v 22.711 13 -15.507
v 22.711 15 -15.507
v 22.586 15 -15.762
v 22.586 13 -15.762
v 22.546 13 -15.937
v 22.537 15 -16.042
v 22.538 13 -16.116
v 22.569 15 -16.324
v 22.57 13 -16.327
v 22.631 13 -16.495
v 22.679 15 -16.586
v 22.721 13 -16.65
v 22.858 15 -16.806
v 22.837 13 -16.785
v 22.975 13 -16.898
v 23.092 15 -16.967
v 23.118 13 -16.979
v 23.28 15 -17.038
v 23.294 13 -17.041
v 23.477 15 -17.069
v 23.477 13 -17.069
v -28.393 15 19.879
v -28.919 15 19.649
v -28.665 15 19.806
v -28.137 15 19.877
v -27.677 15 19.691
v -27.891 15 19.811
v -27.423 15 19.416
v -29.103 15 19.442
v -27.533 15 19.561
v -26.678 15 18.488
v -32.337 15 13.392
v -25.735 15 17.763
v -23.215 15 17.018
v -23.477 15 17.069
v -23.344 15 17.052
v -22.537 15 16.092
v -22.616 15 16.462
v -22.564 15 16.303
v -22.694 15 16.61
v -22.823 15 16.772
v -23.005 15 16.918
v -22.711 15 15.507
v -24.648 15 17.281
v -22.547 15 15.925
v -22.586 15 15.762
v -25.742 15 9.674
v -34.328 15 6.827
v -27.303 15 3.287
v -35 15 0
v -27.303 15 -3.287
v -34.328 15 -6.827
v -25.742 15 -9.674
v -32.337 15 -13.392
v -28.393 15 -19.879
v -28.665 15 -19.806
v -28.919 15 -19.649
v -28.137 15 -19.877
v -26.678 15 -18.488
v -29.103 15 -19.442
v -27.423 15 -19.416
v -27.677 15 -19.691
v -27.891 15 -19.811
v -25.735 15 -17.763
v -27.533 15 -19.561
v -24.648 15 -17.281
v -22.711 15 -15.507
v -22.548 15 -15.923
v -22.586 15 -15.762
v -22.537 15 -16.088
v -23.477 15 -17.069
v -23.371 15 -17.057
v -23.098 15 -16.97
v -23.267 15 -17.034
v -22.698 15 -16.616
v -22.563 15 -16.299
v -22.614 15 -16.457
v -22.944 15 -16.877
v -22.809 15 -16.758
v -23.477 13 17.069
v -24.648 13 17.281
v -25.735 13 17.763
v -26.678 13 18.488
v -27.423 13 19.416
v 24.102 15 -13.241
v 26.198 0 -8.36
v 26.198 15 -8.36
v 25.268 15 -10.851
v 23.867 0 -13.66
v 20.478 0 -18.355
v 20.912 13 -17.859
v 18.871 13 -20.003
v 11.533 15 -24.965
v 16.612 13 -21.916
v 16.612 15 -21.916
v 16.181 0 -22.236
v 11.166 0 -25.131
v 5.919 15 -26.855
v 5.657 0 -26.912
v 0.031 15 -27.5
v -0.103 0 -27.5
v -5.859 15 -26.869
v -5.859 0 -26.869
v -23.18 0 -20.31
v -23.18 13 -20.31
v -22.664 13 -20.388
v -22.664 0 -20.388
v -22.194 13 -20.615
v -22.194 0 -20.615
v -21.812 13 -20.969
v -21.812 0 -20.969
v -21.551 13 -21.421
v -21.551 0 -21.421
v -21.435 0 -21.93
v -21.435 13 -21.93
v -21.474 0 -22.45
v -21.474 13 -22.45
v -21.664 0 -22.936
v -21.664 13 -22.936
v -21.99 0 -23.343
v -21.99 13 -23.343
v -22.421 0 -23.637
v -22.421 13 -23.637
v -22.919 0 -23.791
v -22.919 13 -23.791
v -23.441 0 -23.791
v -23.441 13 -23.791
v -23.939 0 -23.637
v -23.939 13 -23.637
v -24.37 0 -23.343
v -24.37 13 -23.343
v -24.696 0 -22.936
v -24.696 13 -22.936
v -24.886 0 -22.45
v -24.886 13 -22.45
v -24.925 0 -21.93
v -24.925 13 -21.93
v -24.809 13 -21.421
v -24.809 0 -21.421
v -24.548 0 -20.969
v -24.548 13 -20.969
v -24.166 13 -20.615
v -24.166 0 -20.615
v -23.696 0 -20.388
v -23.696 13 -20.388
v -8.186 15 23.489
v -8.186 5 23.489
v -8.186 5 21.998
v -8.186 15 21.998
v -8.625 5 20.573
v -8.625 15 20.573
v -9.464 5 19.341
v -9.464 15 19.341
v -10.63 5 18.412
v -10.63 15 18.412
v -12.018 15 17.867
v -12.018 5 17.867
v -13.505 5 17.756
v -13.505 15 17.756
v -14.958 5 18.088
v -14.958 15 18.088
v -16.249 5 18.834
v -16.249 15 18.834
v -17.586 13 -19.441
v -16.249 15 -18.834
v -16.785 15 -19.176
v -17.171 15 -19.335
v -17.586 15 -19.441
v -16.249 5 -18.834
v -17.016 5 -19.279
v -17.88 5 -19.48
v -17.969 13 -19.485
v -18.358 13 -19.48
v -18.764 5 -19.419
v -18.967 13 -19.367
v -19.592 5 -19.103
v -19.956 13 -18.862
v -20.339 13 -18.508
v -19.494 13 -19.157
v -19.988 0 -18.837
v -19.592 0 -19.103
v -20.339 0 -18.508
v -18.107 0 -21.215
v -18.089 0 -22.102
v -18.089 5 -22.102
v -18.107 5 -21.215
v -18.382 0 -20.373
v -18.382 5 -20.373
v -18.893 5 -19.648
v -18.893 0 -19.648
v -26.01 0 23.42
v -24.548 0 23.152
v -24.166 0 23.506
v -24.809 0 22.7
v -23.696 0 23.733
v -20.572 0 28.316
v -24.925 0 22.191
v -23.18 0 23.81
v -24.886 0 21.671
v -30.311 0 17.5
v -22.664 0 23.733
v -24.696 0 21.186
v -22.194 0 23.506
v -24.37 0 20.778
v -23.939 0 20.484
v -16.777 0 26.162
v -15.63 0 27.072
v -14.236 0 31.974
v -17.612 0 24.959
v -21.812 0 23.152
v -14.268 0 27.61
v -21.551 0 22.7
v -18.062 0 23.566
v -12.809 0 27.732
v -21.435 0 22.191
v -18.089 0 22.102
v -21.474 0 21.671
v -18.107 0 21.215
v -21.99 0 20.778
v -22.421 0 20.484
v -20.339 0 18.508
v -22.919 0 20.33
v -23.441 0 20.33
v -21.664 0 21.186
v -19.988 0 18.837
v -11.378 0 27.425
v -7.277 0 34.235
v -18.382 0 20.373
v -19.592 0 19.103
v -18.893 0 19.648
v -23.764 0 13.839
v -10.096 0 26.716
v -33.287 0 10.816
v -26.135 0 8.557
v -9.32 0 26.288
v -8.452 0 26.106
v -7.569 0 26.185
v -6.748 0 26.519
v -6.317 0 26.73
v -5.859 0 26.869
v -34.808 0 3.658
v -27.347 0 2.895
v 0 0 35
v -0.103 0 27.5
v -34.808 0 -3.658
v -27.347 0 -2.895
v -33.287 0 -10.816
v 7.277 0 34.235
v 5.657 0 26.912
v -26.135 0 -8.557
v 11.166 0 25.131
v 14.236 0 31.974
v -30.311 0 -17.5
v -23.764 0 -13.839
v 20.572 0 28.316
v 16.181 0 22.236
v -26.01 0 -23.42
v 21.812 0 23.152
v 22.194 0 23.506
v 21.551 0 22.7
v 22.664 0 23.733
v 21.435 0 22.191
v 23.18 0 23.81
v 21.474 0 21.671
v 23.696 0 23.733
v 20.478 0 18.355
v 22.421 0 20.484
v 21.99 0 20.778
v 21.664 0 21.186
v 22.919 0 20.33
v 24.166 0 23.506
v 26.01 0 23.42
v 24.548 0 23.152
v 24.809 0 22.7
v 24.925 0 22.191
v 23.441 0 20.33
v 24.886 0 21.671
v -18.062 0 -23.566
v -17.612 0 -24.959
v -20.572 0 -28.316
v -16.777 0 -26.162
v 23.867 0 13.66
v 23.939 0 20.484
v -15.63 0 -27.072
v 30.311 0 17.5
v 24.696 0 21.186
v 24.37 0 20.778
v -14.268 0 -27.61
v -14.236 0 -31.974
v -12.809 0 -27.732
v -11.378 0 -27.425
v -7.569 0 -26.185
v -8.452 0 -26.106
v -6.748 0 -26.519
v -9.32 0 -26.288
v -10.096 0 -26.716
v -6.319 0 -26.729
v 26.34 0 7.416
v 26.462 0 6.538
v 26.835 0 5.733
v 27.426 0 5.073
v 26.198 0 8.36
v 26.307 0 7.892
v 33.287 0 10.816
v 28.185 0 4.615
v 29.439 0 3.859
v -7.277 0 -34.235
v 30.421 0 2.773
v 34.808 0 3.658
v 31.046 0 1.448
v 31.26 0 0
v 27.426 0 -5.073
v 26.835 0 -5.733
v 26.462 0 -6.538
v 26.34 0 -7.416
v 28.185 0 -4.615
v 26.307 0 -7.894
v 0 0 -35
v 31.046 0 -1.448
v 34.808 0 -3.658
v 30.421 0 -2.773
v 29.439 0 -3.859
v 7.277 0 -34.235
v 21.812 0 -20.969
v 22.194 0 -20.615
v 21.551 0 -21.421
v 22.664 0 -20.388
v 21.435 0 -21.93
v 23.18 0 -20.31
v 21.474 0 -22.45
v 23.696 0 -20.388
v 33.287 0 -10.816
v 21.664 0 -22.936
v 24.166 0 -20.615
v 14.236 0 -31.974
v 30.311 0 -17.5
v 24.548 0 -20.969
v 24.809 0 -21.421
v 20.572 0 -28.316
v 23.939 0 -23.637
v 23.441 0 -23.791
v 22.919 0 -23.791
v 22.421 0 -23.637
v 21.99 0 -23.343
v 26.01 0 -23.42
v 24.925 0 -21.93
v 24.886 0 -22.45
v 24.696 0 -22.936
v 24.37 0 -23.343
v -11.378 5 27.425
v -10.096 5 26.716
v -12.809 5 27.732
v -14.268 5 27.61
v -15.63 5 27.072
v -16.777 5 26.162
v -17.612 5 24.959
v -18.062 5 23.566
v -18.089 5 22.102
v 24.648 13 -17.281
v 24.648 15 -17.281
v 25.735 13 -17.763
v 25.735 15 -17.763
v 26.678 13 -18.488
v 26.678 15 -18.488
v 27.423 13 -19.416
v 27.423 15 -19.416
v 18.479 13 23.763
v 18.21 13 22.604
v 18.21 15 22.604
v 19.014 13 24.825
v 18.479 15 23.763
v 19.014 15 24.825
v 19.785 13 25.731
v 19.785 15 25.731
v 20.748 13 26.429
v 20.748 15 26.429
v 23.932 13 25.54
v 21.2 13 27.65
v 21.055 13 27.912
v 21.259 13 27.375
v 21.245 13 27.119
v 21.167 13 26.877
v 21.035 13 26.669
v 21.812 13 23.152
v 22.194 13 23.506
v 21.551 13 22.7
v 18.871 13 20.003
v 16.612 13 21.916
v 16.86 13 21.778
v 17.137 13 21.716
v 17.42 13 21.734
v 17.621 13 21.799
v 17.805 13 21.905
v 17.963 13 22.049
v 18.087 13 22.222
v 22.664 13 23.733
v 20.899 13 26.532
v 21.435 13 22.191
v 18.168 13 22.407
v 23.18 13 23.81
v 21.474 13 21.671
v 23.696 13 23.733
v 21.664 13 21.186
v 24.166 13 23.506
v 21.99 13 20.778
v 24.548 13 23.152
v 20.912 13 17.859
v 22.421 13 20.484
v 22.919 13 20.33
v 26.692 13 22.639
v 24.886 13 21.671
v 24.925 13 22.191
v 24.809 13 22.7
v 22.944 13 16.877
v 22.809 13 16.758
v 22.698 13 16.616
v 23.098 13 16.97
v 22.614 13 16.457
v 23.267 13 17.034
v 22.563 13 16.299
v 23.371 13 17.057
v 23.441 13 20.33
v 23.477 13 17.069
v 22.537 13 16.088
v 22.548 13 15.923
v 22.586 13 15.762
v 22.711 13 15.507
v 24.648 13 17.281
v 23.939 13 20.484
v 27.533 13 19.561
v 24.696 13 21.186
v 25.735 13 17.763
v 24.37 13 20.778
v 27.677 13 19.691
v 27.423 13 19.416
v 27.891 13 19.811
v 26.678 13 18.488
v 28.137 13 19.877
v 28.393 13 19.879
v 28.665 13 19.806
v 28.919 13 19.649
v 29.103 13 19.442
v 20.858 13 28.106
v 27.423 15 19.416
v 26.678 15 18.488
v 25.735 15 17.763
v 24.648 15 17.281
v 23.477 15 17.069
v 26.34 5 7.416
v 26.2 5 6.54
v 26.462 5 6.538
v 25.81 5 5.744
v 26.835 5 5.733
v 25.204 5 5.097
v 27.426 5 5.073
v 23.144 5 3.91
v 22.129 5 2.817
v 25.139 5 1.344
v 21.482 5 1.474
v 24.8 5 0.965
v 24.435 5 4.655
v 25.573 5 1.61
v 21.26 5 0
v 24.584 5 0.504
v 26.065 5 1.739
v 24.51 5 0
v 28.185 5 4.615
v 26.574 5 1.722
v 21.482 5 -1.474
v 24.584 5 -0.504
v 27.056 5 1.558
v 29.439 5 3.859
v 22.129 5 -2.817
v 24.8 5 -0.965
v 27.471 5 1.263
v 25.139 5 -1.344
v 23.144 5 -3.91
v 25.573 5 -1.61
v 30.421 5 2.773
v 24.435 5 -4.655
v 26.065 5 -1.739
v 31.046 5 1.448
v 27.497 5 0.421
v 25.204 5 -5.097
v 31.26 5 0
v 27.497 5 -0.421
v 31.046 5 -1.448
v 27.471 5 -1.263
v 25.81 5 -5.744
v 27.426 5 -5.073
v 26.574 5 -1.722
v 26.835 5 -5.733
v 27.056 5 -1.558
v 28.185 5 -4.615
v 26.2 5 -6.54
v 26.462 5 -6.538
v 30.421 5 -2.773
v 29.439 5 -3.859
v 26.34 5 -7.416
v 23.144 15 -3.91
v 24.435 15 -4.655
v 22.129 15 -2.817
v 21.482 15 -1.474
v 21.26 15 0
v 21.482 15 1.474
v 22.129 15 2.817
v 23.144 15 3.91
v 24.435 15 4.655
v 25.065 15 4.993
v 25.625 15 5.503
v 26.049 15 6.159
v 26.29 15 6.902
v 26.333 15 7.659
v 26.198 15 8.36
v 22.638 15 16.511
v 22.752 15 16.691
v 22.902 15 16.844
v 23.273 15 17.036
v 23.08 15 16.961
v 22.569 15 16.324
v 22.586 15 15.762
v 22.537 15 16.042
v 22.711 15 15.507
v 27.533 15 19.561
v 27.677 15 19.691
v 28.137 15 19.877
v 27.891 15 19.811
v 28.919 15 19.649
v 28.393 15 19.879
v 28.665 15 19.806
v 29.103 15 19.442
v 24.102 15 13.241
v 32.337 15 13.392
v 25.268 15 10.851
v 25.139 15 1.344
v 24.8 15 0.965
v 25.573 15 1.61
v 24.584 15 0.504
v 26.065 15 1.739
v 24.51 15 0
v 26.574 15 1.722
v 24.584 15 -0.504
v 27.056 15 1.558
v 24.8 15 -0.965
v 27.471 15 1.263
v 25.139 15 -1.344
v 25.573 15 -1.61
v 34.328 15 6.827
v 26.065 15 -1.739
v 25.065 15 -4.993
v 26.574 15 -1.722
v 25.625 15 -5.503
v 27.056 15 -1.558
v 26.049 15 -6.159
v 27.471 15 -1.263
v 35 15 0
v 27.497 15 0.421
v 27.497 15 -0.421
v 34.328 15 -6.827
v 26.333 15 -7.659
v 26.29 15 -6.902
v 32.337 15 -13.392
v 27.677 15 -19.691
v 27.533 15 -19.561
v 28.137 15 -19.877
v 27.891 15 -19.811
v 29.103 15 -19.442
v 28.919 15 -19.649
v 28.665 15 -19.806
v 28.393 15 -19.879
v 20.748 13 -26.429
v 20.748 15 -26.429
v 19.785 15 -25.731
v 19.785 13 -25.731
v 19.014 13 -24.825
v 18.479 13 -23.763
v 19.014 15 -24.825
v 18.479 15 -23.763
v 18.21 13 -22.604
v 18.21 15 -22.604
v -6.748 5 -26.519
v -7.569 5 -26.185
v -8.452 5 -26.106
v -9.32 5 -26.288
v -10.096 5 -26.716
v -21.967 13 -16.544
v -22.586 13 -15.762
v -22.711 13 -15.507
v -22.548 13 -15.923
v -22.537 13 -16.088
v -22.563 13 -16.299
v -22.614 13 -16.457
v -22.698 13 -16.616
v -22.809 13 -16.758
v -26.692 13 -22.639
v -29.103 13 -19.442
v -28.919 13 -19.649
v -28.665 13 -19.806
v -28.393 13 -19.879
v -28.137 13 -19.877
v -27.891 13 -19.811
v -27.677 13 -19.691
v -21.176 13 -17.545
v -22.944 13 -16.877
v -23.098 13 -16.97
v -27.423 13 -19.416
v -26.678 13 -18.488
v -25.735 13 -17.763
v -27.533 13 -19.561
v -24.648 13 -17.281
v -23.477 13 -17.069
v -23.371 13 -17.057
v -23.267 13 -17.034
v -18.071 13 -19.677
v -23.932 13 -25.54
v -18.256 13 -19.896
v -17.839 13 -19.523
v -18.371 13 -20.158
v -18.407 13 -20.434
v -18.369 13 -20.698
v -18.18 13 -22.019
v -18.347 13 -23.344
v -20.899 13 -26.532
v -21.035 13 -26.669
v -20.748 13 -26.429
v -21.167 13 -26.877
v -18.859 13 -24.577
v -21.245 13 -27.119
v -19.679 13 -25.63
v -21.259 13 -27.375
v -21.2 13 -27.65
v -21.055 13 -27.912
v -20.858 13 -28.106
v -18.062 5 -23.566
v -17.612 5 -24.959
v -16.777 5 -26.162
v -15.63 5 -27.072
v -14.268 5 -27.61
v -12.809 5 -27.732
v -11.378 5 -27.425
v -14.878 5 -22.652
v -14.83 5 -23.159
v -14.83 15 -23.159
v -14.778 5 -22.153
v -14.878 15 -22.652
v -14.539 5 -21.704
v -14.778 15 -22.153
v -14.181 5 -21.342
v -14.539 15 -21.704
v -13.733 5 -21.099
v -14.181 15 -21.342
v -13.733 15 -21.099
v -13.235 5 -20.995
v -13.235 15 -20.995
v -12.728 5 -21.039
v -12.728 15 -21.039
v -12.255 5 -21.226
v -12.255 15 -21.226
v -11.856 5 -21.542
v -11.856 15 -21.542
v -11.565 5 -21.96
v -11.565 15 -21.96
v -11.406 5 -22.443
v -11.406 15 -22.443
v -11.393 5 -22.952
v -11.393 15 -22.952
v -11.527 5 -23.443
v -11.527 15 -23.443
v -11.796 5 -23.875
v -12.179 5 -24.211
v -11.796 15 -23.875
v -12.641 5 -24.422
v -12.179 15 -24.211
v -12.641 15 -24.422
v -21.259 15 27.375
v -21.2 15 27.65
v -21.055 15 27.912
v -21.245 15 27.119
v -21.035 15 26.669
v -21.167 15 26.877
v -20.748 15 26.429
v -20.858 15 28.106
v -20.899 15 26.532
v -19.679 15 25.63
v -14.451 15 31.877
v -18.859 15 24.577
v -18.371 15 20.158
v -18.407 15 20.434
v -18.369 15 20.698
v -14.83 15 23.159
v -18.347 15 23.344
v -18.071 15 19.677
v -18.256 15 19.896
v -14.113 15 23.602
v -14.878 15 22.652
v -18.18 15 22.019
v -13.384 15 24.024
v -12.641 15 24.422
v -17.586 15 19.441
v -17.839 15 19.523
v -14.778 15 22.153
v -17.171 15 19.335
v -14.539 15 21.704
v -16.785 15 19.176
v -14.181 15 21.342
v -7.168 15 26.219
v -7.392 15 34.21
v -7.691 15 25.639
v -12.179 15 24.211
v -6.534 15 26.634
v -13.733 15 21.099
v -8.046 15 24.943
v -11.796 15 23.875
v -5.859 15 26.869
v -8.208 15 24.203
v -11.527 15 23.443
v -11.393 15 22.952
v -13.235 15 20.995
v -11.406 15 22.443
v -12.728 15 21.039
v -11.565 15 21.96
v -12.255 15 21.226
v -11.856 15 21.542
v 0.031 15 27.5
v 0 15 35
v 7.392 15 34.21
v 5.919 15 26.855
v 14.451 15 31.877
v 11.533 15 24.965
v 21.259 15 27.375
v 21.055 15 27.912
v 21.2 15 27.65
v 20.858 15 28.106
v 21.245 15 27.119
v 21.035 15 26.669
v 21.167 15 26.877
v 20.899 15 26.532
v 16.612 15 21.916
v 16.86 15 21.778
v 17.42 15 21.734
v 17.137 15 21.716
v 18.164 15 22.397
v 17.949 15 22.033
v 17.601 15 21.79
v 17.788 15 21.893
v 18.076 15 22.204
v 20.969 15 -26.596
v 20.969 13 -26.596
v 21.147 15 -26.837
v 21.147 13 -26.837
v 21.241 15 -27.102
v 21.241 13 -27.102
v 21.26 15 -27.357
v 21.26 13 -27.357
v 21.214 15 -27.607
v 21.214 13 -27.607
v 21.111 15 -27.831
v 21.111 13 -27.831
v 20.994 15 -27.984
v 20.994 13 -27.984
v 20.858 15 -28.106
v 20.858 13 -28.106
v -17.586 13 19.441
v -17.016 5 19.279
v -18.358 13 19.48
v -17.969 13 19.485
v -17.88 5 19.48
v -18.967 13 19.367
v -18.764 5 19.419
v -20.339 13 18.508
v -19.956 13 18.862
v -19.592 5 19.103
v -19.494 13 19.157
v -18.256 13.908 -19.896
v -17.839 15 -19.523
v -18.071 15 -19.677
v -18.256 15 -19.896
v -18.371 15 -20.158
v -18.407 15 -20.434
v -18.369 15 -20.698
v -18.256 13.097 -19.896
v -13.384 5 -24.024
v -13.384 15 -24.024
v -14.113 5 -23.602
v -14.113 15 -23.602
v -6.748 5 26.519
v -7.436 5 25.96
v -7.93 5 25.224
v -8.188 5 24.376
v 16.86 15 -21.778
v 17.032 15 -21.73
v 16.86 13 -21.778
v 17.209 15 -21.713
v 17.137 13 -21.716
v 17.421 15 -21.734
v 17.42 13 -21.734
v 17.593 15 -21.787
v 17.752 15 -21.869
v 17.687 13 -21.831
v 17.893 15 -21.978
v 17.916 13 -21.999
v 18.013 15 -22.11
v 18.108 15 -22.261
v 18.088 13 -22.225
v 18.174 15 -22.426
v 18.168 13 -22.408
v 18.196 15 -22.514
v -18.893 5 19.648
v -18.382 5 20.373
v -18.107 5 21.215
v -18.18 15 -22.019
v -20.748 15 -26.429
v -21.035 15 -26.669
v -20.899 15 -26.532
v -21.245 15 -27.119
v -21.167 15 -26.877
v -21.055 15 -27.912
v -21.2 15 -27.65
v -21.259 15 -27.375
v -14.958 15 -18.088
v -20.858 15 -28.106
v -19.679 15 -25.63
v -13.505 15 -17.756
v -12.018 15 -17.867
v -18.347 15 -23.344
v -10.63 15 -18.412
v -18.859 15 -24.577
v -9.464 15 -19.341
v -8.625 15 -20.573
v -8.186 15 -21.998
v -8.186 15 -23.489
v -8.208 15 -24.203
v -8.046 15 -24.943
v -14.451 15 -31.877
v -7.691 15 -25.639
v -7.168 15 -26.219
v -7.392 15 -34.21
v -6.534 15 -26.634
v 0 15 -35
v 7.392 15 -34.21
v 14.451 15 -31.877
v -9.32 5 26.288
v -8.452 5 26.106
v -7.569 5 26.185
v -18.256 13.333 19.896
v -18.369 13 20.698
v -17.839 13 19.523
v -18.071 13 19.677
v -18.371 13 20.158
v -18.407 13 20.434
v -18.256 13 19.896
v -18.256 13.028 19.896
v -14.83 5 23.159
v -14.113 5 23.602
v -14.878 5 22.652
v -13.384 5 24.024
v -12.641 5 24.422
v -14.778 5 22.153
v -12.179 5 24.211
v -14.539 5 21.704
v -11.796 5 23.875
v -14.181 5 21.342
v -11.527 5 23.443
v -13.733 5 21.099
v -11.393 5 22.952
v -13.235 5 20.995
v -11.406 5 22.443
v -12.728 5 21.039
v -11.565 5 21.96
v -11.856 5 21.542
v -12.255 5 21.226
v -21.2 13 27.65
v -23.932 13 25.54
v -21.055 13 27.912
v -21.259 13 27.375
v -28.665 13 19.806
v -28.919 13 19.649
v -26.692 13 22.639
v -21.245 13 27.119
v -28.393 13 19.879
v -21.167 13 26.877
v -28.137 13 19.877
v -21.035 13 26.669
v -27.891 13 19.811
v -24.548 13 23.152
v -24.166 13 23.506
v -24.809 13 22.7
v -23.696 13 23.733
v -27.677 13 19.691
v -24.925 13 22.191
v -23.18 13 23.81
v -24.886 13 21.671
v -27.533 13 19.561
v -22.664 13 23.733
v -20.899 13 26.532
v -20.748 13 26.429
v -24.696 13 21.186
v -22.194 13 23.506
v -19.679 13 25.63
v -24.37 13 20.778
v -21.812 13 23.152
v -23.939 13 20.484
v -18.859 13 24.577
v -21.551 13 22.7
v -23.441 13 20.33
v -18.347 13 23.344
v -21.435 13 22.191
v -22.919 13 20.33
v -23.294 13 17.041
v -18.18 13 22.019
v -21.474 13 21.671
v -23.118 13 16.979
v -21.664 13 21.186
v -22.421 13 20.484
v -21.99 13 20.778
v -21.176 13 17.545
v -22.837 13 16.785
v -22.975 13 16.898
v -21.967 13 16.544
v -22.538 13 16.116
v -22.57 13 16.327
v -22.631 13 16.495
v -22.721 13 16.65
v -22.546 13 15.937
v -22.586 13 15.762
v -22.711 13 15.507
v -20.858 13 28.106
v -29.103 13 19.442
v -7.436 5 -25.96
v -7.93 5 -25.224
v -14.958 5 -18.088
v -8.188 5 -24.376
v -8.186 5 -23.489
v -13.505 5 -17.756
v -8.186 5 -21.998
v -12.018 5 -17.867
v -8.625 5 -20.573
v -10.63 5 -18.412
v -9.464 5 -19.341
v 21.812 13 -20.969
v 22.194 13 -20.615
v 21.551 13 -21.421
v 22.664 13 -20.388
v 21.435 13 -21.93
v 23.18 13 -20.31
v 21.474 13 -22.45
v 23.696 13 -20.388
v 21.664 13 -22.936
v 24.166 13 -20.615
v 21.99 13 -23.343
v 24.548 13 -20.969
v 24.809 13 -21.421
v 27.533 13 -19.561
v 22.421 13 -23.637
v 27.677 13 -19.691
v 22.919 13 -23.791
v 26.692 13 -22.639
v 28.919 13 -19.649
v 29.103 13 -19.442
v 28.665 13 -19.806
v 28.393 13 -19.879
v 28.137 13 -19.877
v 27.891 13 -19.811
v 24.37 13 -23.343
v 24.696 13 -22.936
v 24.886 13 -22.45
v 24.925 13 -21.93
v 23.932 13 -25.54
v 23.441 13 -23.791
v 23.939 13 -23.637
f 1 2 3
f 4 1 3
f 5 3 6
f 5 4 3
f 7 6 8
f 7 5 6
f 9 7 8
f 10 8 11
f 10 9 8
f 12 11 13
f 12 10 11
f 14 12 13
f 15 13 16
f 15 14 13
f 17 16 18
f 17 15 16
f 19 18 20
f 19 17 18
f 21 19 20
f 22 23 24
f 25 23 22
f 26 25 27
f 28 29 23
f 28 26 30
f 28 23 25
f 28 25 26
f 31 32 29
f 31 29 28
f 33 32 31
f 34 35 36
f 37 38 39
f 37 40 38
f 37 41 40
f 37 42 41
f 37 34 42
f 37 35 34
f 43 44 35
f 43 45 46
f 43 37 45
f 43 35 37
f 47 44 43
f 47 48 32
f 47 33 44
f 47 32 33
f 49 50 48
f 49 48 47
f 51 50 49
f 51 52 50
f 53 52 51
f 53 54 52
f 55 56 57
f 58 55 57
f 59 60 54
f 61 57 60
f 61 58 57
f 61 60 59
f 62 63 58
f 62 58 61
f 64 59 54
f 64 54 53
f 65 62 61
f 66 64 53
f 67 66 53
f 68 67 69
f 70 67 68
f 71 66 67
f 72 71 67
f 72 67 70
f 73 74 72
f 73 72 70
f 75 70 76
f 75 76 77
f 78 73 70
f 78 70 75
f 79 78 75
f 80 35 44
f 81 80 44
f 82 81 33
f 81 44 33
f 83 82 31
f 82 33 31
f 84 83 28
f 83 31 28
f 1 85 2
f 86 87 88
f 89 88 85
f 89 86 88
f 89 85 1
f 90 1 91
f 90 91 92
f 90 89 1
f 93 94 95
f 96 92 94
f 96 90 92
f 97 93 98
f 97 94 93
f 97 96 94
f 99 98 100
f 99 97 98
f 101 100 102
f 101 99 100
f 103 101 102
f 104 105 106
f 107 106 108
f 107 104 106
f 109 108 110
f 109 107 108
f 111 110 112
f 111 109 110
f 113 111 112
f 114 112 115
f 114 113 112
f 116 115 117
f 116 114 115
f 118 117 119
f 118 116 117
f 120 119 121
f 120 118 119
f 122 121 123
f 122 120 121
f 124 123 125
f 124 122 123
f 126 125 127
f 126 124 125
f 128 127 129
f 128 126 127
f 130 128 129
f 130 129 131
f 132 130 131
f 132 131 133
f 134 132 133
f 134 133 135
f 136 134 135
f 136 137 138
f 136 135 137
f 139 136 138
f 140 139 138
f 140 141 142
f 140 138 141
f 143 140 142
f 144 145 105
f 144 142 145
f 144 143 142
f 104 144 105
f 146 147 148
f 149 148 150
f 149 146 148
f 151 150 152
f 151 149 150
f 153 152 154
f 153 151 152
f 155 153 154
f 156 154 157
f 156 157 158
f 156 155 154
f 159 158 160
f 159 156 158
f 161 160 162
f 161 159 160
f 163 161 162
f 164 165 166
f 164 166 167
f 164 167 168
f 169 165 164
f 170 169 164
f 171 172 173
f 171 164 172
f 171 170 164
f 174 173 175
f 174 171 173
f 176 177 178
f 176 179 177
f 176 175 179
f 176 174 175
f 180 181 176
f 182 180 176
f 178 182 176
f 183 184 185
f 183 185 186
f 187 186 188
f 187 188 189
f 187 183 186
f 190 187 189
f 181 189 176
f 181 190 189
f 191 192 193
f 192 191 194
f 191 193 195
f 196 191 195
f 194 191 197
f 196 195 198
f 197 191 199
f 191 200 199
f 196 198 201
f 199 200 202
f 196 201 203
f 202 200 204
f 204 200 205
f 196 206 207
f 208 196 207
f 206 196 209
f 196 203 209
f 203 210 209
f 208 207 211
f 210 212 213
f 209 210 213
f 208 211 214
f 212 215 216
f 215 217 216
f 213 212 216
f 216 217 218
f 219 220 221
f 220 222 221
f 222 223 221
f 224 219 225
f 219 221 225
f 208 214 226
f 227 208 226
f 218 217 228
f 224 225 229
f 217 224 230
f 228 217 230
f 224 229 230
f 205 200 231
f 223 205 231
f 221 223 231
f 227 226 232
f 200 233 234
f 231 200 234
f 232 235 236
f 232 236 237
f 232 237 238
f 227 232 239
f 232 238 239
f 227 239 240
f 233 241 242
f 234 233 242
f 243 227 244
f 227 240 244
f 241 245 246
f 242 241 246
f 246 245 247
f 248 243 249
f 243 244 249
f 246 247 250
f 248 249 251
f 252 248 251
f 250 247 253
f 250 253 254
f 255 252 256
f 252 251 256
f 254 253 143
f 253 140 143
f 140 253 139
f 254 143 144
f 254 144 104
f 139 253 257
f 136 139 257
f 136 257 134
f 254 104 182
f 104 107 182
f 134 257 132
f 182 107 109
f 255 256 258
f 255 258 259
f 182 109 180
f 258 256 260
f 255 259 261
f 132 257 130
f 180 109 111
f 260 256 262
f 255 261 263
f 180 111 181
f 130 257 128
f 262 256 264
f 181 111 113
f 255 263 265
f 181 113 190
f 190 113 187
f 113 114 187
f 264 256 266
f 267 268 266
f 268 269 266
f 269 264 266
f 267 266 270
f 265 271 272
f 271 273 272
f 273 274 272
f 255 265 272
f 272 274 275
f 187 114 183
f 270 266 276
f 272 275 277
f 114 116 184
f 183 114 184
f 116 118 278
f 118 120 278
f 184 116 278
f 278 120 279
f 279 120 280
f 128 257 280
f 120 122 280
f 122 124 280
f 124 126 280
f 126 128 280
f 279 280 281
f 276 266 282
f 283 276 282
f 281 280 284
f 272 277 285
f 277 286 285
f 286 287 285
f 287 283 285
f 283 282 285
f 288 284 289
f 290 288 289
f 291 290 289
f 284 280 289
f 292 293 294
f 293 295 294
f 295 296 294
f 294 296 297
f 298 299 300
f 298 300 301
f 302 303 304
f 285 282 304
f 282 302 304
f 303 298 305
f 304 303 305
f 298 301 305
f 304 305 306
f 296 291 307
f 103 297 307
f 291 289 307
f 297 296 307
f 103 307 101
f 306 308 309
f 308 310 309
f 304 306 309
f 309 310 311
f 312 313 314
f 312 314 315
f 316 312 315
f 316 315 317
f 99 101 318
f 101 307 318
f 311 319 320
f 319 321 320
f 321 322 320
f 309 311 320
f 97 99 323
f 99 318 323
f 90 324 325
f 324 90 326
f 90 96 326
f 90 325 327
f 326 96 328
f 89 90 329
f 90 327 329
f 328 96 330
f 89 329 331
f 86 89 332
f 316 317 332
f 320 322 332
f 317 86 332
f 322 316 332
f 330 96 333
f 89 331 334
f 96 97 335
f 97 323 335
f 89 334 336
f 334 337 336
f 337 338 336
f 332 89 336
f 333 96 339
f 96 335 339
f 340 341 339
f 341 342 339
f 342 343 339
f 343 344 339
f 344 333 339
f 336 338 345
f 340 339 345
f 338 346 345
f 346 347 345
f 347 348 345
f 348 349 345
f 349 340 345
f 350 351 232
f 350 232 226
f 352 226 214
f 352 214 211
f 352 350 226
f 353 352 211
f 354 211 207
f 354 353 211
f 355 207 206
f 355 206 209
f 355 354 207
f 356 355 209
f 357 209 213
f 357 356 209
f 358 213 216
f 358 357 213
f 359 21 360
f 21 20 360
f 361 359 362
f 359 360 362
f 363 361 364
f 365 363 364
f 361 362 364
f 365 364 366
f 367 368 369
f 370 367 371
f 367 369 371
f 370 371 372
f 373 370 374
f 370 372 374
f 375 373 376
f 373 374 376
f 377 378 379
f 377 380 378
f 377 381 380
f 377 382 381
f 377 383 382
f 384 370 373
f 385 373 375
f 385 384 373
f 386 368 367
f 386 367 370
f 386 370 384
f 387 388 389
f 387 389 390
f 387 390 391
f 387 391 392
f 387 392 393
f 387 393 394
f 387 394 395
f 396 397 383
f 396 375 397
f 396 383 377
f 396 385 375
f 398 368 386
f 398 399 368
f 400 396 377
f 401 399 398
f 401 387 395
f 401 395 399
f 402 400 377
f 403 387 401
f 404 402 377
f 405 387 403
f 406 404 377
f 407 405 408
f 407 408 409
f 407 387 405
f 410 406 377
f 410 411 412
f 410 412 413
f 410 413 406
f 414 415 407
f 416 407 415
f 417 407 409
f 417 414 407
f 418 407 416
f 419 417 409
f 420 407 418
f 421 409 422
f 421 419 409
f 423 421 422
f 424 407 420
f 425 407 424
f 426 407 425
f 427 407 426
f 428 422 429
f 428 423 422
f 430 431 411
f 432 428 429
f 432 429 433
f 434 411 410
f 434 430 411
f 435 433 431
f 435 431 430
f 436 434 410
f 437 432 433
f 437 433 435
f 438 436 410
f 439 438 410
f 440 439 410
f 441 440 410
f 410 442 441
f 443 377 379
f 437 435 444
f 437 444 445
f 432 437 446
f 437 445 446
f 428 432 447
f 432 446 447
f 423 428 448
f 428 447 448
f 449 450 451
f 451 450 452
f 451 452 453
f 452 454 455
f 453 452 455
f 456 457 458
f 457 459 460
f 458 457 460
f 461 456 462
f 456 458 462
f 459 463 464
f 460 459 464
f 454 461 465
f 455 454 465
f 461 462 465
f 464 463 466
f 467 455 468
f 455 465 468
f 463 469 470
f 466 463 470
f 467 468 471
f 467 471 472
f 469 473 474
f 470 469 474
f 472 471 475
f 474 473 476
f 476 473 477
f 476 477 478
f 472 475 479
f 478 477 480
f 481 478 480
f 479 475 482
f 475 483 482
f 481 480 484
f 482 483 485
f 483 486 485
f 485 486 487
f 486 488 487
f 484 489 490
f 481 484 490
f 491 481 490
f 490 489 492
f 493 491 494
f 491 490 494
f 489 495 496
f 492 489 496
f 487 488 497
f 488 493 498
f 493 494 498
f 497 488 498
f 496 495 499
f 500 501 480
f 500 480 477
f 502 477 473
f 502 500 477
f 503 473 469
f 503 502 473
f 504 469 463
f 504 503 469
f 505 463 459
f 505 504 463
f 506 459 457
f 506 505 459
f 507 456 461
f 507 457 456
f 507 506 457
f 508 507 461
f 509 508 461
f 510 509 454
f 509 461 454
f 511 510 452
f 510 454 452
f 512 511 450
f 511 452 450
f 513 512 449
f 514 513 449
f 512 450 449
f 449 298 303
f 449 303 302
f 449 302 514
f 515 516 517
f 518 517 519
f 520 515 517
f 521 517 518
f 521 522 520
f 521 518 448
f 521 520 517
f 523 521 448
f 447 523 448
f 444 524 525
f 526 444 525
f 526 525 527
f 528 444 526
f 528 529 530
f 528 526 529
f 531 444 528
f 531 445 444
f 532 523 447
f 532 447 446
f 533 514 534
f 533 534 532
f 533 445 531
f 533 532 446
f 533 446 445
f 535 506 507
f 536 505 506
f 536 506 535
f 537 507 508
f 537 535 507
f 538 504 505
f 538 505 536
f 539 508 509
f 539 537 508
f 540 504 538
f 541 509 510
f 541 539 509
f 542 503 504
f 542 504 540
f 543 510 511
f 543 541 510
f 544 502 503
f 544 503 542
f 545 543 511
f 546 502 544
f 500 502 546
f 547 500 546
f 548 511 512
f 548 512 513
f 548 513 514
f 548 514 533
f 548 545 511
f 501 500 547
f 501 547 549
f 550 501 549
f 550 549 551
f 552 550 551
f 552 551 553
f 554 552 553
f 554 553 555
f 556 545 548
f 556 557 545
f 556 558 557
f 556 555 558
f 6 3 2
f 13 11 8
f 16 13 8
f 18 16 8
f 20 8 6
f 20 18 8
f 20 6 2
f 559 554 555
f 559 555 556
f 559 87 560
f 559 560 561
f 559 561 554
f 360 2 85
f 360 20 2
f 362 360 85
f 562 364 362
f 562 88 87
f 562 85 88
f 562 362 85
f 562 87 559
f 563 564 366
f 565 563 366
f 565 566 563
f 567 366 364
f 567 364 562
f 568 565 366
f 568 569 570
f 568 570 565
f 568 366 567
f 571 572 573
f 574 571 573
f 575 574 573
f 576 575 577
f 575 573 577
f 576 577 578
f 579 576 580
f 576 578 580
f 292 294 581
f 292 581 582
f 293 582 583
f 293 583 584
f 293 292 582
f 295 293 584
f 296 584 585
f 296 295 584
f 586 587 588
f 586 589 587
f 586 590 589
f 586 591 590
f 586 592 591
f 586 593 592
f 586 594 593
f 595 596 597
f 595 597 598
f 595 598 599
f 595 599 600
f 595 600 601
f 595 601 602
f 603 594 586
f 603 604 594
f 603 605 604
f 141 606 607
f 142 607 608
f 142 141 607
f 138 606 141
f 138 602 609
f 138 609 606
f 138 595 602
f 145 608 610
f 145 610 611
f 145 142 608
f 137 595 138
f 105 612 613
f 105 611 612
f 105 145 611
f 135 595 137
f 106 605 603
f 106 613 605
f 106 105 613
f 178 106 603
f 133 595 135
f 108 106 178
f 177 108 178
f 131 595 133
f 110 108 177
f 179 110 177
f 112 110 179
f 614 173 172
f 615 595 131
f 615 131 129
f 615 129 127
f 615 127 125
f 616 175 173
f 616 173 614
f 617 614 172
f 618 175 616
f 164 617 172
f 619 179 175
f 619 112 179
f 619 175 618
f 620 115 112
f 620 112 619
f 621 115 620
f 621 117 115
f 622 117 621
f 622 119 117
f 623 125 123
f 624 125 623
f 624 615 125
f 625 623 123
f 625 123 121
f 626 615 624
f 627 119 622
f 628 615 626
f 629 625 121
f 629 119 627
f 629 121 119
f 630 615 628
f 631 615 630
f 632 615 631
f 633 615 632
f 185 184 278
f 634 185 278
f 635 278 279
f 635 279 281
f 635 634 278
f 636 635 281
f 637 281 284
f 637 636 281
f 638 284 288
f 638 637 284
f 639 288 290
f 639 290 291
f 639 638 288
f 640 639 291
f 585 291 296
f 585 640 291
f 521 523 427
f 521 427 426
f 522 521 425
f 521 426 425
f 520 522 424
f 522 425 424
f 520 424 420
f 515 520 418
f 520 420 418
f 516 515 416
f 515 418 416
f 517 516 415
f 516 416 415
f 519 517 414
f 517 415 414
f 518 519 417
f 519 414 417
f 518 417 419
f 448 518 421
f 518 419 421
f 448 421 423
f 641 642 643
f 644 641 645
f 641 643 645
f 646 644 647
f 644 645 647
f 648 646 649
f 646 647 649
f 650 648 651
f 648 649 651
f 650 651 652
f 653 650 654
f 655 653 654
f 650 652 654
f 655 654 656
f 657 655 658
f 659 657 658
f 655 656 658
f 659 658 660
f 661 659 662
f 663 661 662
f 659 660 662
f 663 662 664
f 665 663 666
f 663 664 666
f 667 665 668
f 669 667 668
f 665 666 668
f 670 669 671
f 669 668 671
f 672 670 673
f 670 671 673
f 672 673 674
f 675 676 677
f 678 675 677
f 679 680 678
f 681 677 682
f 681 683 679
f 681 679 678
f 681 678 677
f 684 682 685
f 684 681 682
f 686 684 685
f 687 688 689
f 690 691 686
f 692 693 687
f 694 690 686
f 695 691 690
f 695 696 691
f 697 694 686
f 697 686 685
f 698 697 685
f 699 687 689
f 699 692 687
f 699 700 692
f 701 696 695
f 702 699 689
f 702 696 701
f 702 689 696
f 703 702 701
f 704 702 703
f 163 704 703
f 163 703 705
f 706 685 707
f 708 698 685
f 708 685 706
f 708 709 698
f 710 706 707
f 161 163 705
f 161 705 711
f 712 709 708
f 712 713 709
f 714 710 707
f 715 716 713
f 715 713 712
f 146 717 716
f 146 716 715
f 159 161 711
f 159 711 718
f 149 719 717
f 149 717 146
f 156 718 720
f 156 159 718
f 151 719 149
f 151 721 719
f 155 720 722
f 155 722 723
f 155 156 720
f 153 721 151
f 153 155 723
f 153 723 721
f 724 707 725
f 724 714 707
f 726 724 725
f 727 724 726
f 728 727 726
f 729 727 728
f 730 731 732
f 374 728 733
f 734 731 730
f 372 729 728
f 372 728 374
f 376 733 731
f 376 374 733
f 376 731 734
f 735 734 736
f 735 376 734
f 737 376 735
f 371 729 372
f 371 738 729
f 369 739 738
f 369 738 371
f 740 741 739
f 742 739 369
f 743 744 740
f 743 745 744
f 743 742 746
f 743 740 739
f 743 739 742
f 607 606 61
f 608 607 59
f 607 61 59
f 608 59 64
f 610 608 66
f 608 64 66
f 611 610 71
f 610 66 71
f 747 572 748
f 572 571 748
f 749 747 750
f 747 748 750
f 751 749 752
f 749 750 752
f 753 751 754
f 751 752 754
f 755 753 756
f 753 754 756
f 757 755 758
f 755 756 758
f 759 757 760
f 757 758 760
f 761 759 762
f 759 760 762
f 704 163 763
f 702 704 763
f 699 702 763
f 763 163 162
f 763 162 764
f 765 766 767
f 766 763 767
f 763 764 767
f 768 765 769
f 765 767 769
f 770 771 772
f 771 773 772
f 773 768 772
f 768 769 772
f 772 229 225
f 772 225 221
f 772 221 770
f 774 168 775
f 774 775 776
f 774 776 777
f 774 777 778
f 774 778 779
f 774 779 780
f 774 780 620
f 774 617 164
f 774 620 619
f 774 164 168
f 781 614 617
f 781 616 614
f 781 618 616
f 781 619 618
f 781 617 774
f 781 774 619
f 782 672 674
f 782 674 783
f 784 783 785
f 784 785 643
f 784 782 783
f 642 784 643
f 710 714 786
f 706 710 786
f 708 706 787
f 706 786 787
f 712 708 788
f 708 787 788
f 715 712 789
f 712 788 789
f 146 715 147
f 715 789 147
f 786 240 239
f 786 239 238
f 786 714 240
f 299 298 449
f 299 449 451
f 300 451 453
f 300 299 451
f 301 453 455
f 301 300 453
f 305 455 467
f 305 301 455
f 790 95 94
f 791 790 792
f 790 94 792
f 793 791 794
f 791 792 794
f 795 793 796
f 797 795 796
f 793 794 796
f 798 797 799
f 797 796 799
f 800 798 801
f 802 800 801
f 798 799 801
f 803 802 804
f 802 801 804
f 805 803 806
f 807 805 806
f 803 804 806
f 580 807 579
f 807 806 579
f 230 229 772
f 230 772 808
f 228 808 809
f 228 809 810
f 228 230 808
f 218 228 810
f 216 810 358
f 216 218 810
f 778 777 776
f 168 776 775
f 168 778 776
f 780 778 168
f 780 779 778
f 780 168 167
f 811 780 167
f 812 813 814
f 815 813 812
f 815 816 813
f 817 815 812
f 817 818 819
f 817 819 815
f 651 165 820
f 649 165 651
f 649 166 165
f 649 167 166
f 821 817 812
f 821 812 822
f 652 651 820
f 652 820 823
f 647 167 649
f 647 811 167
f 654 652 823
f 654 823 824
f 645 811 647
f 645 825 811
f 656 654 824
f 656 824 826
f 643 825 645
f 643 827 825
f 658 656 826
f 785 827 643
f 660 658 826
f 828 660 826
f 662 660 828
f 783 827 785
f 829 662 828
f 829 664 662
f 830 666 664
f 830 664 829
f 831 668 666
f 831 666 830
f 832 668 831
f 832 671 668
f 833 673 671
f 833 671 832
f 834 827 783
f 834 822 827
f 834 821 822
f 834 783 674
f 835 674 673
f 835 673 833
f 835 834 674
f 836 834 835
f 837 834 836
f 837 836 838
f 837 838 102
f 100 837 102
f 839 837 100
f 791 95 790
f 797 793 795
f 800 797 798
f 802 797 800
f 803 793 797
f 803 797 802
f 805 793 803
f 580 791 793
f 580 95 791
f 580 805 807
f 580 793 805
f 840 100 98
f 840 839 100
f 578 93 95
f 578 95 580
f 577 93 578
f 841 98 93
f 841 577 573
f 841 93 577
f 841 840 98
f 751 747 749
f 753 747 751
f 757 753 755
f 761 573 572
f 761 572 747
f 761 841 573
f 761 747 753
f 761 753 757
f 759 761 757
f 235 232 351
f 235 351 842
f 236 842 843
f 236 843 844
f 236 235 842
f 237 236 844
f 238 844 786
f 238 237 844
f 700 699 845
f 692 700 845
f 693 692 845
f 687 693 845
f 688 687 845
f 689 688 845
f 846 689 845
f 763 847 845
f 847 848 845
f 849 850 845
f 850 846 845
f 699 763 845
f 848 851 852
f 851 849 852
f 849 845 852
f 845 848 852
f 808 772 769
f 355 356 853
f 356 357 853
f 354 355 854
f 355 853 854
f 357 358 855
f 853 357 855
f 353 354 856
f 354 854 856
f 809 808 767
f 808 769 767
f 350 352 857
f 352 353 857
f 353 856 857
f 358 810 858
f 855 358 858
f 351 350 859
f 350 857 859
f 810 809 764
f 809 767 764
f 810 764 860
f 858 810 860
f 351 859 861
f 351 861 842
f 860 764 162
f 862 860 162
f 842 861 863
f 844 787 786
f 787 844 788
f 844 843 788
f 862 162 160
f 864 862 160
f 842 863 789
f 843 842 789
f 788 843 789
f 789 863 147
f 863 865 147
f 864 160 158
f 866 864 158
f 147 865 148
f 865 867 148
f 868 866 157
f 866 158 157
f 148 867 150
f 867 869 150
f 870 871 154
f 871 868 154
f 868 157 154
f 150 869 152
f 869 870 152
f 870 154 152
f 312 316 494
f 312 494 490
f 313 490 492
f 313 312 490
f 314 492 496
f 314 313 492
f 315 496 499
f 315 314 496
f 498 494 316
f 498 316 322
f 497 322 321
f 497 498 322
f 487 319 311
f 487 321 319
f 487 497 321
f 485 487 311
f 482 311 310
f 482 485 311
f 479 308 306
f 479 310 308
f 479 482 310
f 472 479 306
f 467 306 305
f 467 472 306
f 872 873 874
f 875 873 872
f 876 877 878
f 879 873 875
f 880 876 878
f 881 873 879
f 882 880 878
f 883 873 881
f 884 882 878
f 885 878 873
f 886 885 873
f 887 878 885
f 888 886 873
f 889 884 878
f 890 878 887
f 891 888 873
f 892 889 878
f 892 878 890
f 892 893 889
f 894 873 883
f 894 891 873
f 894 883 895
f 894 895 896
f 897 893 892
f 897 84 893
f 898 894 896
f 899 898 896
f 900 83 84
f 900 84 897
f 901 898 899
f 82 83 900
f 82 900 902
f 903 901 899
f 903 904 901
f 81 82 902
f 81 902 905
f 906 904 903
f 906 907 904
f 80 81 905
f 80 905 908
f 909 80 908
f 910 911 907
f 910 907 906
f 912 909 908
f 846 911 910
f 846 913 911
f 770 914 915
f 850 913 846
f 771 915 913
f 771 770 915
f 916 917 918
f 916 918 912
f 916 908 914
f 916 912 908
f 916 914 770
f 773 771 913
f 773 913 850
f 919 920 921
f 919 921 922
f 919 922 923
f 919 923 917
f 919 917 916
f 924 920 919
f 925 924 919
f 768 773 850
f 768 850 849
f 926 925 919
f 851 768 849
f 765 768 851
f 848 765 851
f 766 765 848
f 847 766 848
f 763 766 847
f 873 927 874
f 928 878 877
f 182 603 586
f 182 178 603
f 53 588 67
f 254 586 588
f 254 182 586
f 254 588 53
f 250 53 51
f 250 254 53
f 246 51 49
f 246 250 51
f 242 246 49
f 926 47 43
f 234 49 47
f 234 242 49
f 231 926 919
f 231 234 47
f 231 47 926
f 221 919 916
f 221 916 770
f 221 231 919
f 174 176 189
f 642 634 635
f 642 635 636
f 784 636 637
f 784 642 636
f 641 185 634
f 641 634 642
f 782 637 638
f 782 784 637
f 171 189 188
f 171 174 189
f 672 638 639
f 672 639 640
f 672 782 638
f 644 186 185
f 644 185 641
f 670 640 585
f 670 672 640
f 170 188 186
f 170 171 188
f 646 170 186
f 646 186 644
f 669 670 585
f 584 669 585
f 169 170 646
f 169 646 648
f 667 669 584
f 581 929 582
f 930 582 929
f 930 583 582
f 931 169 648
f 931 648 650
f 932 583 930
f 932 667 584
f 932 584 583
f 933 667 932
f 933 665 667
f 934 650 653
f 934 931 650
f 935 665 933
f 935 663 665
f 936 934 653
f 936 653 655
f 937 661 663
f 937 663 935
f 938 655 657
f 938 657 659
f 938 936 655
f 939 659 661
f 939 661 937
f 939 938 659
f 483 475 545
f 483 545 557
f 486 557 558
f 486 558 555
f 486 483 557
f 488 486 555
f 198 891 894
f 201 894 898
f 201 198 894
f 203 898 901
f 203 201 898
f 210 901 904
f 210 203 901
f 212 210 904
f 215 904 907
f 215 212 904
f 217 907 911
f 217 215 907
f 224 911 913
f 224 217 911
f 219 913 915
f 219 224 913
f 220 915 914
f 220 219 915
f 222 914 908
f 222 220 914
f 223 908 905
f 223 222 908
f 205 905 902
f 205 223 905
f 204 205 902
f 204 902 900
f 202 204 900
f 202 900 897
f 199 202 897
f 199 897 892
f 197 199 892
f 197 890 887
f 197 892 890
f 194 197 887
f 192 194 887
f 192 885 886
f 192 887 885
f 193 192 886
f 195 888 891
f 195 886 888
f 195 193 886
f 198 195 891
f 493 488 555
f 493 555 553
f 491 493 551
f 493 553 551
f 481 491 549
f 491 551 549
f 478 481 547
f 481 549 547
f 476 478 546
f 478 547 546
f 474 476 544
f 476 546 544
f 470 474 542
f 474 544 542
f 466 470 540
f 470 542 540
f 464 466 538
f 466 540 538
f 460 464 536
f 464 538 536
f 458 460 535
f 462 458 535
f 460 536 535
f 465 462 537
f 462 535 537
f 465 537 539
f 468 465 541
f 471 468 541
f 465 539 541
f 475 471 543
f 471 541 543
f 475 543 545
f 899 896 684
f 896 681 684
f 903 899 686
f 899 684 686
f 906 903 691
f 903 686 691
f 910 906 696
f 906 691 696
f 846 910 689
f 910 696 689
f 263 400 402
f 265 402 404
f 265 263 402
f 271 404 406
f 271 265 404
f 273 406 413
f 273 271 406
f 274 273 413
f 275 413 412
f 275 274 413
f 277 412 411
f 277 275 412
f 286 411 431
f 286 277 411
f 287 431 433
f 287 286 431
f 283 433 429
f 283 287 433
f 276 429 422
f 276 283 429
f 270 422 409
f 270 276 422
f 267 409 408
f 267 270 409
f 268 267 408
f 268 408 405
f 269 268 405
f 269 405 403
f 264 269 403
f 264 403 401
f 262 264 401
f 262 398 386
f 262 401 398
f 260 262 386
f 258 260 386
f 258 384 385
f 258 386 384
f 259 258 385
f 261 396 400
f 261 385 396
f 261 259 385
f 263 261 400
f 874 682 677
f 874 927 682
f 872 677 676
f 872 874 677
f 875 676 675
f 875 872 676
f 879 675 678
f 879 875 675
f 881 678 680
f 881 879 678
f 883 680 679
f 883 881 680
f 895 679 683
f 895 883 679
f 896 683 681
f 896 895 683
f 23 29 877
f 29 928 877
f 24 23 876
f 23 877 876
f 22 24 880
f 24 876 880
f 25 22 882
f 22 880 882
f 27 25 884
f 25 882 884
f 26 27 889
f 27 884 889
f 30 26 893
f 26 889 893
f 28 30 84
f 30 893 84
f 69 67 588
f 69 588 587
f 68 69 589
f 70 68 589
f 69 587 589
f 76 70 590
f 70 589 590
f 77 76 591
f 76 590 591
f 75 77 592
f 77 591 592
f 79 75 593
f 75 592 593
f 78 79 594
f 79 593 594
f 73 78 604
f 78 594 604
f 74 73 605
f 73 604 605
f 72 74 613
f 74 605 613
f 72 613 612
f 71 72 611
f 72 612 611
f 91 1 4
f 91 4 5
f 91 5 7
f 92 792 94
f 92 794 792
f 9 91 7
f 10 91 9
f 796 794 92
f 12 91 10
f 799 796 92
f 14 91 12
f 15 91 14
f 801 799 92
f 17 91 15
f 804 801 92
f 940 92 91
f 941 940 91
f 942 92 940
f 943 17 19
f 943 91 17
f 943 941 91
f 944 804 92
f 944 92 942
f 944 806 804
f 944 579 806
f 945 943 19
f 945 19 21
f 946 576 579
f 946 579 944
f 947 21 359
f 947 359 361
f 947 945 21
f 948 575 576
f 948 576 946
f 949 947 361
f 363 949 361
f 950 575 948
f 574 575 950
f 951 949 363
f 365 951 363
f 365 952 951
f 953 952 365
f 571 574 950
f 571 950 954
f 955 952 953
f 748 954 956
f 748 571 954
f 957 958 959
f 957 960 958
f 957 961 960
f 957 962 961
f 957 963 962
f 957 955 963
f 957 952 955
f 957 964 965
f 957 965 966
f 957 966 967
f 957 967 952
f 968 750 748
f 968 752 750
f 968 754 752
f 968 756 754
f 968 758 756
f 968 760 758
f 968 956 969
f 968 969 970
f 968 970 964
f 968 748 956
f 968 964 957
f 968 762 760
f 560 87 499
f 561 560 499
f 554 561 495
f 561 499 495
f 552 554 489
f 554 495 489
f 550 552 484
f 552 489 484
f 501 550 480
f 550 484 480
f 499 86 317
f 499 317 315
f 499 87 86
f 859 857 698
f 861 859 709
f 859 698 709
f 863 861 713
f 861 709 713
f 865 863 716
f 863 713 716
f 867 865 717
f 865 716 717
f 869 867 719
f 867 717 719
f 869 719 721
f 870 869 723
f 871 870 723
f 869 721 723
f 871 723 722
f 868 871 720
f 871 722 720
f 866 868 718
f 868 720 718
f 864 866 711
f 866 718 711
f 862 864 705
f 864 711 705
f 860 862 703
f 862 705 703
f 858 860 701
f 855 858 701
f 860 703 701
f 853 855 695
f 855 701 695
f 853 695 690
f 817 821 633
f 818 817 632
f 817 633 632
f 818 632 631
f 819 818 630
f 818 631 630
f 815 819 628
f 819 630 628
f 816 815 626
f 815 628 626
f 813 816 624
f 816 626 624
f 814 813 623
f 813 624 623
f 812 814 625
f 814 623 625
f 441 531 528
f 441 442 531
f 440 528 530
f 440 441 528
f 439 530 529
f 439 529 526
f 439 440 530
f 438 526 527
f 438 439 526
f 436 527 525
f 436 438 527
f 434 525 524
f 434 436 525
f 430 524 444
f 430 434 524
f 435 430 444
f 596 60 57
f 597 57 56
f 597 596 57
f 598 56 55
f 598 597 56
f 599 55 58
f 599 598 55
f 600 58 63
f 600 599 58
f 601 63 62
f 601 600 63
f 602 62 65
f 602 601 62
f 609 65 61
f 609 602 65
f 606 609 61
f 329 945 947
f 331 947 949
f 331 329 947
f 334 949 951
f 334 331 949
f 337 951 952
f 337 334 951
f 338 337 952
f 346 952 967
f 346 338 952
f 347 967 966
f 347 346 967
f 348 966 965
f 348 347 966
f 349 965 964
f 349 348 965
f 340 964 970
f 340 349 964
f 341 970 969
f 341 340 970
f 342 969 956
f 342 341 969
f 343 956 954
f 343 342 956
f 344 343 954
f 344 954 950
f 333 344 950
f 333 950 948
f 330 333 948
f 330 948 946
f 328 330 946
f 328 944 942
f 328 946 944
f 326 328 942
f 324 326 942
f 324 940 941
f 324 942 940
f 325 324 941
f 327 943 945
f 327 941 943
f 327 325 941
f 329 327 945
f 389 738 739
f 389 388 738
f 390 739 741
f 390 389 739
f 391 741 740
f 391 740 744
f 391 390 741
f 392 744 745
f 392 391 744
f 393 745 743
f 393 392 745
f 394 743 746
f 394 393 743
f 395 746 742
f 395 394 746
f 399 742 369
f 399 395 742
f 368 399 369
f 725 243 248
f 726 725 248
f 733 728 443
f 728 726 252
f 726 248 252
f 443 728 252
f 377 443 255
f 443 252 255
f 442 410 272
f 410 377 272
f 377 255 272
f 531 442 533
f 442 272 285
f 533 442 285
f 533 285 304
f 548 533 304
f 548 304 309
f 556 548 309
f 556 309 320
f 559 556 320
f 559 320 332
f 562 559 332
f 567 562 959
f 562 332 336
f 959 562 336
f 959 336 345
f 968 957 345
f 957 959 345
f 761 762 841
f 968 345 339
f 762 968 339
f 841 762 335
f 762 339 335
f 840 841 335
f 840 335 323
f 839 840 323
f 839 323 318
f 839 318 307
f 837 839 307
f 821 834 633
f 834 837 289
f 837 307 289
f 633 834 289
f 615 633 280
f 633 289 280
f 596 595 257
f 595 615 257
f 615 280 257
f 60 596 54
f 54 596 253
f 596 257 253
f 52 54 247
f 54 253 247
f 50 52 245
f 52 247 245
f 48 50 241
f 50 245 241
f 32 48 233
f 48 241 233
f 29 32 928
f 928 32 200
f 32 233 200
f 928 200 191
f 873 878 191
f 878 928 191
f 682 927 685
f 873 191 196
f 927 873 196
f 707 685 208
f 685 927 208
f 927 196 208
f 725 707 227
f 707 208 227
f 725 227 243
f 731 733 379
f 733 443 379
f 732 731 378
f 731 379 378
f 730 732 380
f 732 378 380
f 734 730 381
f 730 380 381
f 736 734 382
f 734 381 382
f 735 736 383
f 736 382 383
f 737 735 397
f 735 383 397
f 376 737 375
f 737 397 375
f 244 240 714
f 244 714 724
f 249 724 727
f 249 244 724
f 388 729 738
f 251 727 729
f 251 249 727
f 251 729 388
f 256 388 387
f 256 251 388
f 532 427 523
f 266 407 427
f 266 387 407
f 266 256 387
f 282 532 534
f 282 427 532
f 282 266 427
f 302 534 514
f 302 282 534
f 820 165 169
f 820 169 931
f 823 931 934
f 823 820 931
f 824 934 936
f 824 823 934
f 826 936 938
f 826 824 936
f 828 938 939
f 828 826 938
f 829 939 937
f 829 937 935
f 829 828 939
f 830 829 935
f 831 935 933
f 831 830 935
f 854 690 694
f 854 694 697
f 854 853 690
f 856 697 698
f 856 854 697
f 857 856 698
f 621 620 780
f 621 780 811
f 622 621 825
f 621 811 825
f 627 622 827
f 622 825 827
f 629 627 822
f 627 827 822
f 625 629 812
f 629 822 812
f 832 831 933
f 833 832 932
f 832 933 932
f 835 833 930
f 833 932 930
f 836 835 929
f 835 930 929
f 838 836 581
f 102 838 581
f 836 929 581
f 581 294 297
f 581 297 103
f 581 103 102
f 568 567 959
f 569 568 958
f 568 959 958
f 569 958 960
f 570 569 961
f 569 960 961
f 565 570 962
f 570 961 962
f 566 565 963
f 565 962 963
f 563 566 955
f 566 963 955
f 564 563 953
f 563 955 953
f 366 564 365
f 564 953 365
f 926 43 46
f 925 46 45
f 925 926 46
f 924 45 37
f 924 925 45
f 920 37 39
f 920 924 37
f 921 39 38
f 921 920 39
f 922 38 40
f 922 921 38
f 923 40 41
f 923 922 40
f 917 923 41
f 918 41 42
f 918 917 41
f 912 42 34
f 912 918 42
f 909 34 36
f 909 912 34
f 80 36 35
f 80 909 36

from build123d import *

# Parameters (mm, degrees)
SKETCH_1_R          = 35
SKETCH_1_R_2        = 1.75
SKETCH_1_R_3        = 27.5
EXTRUDE_1_DEPTH     = 15
SKETCH_2_R          = 5
SKETCH_2_R_2        = 1.75
EXTRUDE_2_DEPTH     = 15
FILLET_1_R          = 3
SKETCH_3_R          = 5
CUT_EXTRUDE_1_DEPTH = 2
CUT_EXTRUDE_START   = -5
SKETCH_4_R          = 5
CUT_EXTRUDE_2_DEPTH = 5
FILLET_2_DEPTH      = 5
FILLET_3_R          = 1


with BuildPart() as part:
    # Эскиз1 → Бобышка-Вытянуть1 (new body)
    with BuildSketch(Plane(origin=(0, 0, 0), x_dir=(1, 0, 0), z_dir=(0, 1, 0))):
        with Locations(Location((0, 0, 0), (0, 0, 270))):
            Circle(SKETCH_1_R)
        with Locations(Location((-23.18, 22.0605, 0), (0, 0, 270))):
            Circle(SKETCH_1_R_2, mode=Mode.SUBTRACT)
        with Locations(Location((23.18, 22.0605, 0), (0, 0, 270))):
            Circle(SKETCH_1_R_2, mode=Mode.SUBTRACT)
        with Locations(Location((23.18, -22.0605, 0), (0, 0, 270))):
            Circle(SKETCH_1_R_2, mode=Mode.SUBTRACT)
        with Locations(Location((-23.18, -22.0605, 0), (0, 0, 270))):
            Circle(SKETCH_1_R_2, mode=Mode.SUBTRACT)
        with Locations(Location((0, 0, 0), (0, 0, 270))):
            Circle(SKETCH_1_R_3, mode=Mode.SUBTRACT)
    extrude(amount=EXTRUDE_1_DEPTH)

    # Эскиз2 → Бобышка-Вытянуть2 (add)
    # profile 1 of 3: a face of its own
    with BuildSketch(Plane(origin=(0, 15, 0), x_dir=(1, 0, 0), z_dir=(0, 1, 0))):
        with Locations((-13.13, 22.741827103)):
            Circle(SKETCH_2_R)
        with Locations((-13.13, 22.741827103)):
            Circle(SKETCH_2_R_2, mode=Mode.SUBTRACT)
    # profile 2 of 3: a face of its own
    with BuildSketch(Plane(origin=(0, 15, 0), x_dir=(1, 0, 0), z_dir=(0, 1, 0))):
        with Locations((26.26, 0)):
            Circle(SKETCH_2_R)
        with Locations((26.26, 0)):
            Circle(SKETCH_2_R_2, mode=Mode.SUBTRACT)
    # profile 3 of 3: a face of its own
    with BuildSketch(Plane(origin=(0, 15, 0), x_dir=(1, 0, 0), z_dir=(0, 1, 0))):
        with Locations((-13.13, -22.741827103)):
            Circle(SKETCH_2_R)
        with Locations((-13.13, -22.741827103)):
            Circle(SKETCH_2_R_2, mode=Mode.SUBTRACT)
    extrude(amount=-EXTRUDE_2_DEPTH)

    # Скругление1
    fillet_1_edges = [part.edges().sort_by_distance(p)[0] for p in [
        (27.053267327, 7.5, -4.936671647),
        (27.053267327, 7.5, 4.936671647),
        (-17.80191672, 7.5, -20.960480937),
        (-9.251350607, 7.5, -25.897152584),
        (-9.251350607, 7.5, 25.897152584),
        (-17.80191672, 7.5, 20.960480937),
    ]]
    fillet(fillet_1_edges, radius=FILLET_1_R)

    # Эскиз3 → Вырез-Вытянуть1 (cut)
    with BuildSketch(Plane(origin=(0, 15, 0), x_dir=(1, 0, 0), z_dir=(0, 1, 0))):
        with Locations((-23.18, 22.0605)):
            Circle(SKETCH_3_R)
        with Locations((23.18, 22.0605)):
            Circle(SKETCH_3_R)
        with Locations((23.18, -22.0605)):
            Circle(SKETCH_3_R)
        with Locations((-23.18, -22.0605)):
            Circle(SKETCH_3_R)
    extrude(amount=-CUT_EXTRUDE_1_DEPTH, mode=Mode.SUBTRACT)

    # Эскиз4 → Вырез-Вытянуть2 (cut)
    with BuildSketch(Plane.XZ.offset(CUT_EXTRUDE_START)):
        with Locations((-13.13, 22.741827103)):
            Circle(SKETCH_4_R)
        with Locations((26.26, 0)):
            Circle(SKETCH_4_R)
        with Locations((-13.13, -22.741827103)):
            Circle(SKETCH_4_R)
    extrude(amount=CUT_EXTRUDE_2_DEPTH, mode=Mode.SUBTRACT)

    # Скругление2: read off the stored shape, not the designer's step
    # Скругление2 outline → Скругление2 (cut)
    with BuildSketch(Plane(origin=(0, 0, 0), x_dir=(1, 0, 0), z_dir=(0, 1, 0))):
        with BuildLine():
            ThreePointArc((-16.249088608, 18.83397779), (-17.48691602, 20.288812061), (-18.08884989, 22.101664805))
            ThreePointArc((-18.08884989, 22.101664805), (-18.38244619, 20.372795331), (-19.592350799, 19.103417814))
            ThreePointArc((-19.592350799, 19.103417814), (-17.87954729, 19.479572812), (-16.249088608, 18.83397779))
        make_face()
        with BuildLine():
            ThreePointArc((-6.747869727, 26.519182418), (-8.452135208, 26.10606305), (-10.096178242, 26.716235932))
            ThreePointArc((-10.096178242, 26.716235932), (-8.827168648, 25.288519537), (-8.186158917, 23.489112418))
            ThreePointArc((-8.186158917, 23.489112418), (-7.930031265, 25.223928567), (-6.747869727, 26.519182418))
        make_face()
        with BuildLine():
            ThreePointArc((24.435247525, 4.655134628), (26.314084667, 4.999707476), (28.185028132, 4.614571128))
            ThreePointArc((28.185028132, 4.614571128), (26.834581398, 5.733267719), (26.340220525, 7.415764604))
            ThreePointArc((26.340220525, 7.415764604), (25.809578555, 5.744355755), (24.435247525, 4.655134628))
        make_face()
        with BuildLine():
            ThreePointArc((26.340220525, -7.415764604), (26.834581398, -5.733267719), (28.185028132, -4.614571128))
            ThreePointArc((28.185028132, -4.614571128), (26.314084667, -4.999707476), (24.435247525, -4.655134628))
            ThreePointArc((24.435247525, -4.655134628), (25.809578555, -5.744355755), (26.340220525, -7.415764604))
        make_face()
        with BuildLine():
            ThreePointArc((-8.186158917, -23.489112418), (-8.827168648, -25.288519537), (-10.096178242, -26.716235932))
            ThreePointArc((-10.096178242, -26.716235932), (-8.452135208, -26.10606305), (-6.747869727, -26.519182418))
            ThreePointArc((-6.747869727, -26.519182418), (-7.930031265, -25.223928567), (-8.186158917, -23.489112418))
        make_face()
        with BuildLine():
            ThreePointArc((-19.592350799, -19.103417814), (-18.38244619, -20.372795331), (-18.08884989, -22.101664805))
            ThreePointArc((-18.08884989, -22.101664805), (-17.48691602, -20.288812061), (-16.249088608, -18.83397779))
            ThreePointArc((-16.249088608, -18.83397779), (-17.87954729, -19.479572812), (-19.592350799, -19.103417814))
        make_face()
    extrude(amount=FILLET_2_DEPTH, mode=Mode.SUBTRACT)

    # Скругление3
    fillet_3_edges = [part.edges().sort_by_distance(p)[0] for p in [
        (-18.967333591, 14, -19.36727856),
        (-18.967333591, 14, 19.36727856),
        (21.259108635, 14, 17.444205342),
        (18.474346617, 14, 20.370285149),
        (22.293687033, 14, -26.981317953),
        (28.050957484, 14, -20.931884393),
        (-21.259108635, 14, 17.444205342),
        (-28.050957484, 14, 20.931884393),
        (-22.293687033, 14, 26.981317953),
        (22.293687033, 14, 26.981317953),
        (28.050957484, 14, 20.931884393),
        (21.259108635, 14, -17.444205342),
        (18.474346617, 14, -20.370285149),
        (-21.259108635, 14, -17.444205342),
        (-22.293687033, 14, -26.981317953),
        (-28.050957484, 14, -20.931884393),
    ]]
    fillet(fillet_3_edges, radius=FILLET_3_R)


solid = part.part
